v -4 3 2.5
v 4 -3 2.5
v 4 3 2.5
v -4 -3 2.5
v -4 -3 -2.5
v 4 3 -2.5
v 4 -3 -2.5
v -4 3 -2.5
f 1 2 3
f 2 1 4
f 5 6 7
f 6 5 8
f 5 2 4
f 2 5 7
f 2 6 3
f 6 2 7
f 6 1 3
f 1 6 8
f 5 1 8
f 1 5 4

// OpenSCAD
base = 6;
height = base / 2;
depth = base - 1;
centered = true;
label = "box";
dims = [base + 2, height * 2, depth];

cube(size = dims, center = centered);
